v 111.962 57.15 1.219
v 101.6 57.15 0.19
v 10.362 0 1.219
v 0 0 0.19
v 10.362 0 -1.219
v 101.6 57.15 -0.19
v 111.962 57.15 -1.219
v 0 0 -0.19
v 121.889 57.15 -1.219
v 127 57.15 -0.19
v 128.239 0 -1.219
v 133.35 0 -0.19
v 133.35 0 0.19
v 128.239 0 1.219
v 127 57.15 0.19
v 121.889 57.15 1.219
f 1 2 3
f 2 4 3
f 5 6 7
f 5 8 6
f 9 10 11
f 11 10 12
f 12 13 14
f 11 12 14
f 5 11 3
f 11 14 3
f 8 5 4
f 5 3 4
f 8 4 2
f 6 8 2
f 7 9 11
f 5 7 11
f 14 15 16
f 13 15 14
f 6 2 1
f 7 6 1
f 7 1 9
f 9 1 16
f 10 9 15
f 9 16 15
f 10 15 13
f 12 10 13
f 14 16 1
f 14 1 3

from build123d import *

# Parameters (mm, degrees)
BOSS_EXTRUDE1_DEPTH   = 1.2192
CHAMFER1_SIZE         = 5.08
CHAMFER1_SIZE2        = 1.0287
CHAMFER1_PART_2_SIZE  = 5.08
CHAMFER1_PART_2_SIZE2 = 1.0287
CHAMFER2_SIZE         = 5.08
CHAMFER2_SIZE2        = 1.0287
CHAMFER2_PART_2_SIZE  = 5.08
CHAMFER2_PART_2_SIZE2 = 1.0287


with BuildPart() as part:
    # Sketch1 → Boss-Extrude1 (new body, symmetric)
    with BuildSketch(Plane.XY):
        Polygon((0, 0), (101.6, 57.15), (127, 57.15), (133.35, 0), align=None)
    extrude(amount=BOSS_EXTRUDE1_DEPTH, both=True)

    # Chamfer1
    chamfer1_edges = [part.edges().sort_by_distance(p)[0] for p in [
        (50.8, 28.575, 1.2192),
    ]]
    chamfer1_side = [part.faces().sort_by_distance(p)[0] for p in [
        (85.09, 22.098, 1.2192),
    ]]
    chamfer(chamfer1_edges, length=CHAMFER1_SIZE, length2=CHAMFER1_SIZE2, reference=chamfer1_side[0])

    # Chamfer1 part 2
    chamfer1_part_2_edges = [part.edges().sort_by_distance(p)[0] for p in [
        (50.8, 28.575, -1.2192),
    ]]
    chamfer1_part_2_side = [part.faces().sort_by_distance(p)[0] for p in [
        (85.09, 22.098, -1.2192),
    ]]
    chamfer(chamfer1_part_2_edges, length=CHAMFER1_PART_2_SIZE, length2=CHAMFER1_PART_2_SIZE2, reference=chamfer1_part_2_side[0])

    # Chamfer2
    chamfer2_edges = [part.edges().sort_by_distance(p)[0] for p in [
        (130.175, 28.575, -1.2192),
    ]]
    chamfer2_side = [part.faces().sort_by_distance(p)[0] for p in [
        (89.460516254, 21.125525936, -1.2192),
    ]]
    chamfer(chamfer2_edges, length=CHAMFER2_SIZE, length2=CHAMFER2_SIZE2, reference=chamfer2_side[0])

    # Chamfer2 part 2
    chamfer2_part_2_edges = [part.edges().sort_by_distance(p)[0] for p in [
        (130.175, 28.575, 1.2192),
    ]]
    chamfer2_part_2_side = [part.faces().sort_by_distance(p)[0] for p in [
        (89.460516254, 21.125525936, 1.2192),
    ]]
    chamfer(chamfer2_part_2_edges, length=CHAMFER2_PART_2_SIZE, length2=CHAMFER2_PART_2_SIZE2, reference=chamfer2_part_2_side[0])


solid = part.part
